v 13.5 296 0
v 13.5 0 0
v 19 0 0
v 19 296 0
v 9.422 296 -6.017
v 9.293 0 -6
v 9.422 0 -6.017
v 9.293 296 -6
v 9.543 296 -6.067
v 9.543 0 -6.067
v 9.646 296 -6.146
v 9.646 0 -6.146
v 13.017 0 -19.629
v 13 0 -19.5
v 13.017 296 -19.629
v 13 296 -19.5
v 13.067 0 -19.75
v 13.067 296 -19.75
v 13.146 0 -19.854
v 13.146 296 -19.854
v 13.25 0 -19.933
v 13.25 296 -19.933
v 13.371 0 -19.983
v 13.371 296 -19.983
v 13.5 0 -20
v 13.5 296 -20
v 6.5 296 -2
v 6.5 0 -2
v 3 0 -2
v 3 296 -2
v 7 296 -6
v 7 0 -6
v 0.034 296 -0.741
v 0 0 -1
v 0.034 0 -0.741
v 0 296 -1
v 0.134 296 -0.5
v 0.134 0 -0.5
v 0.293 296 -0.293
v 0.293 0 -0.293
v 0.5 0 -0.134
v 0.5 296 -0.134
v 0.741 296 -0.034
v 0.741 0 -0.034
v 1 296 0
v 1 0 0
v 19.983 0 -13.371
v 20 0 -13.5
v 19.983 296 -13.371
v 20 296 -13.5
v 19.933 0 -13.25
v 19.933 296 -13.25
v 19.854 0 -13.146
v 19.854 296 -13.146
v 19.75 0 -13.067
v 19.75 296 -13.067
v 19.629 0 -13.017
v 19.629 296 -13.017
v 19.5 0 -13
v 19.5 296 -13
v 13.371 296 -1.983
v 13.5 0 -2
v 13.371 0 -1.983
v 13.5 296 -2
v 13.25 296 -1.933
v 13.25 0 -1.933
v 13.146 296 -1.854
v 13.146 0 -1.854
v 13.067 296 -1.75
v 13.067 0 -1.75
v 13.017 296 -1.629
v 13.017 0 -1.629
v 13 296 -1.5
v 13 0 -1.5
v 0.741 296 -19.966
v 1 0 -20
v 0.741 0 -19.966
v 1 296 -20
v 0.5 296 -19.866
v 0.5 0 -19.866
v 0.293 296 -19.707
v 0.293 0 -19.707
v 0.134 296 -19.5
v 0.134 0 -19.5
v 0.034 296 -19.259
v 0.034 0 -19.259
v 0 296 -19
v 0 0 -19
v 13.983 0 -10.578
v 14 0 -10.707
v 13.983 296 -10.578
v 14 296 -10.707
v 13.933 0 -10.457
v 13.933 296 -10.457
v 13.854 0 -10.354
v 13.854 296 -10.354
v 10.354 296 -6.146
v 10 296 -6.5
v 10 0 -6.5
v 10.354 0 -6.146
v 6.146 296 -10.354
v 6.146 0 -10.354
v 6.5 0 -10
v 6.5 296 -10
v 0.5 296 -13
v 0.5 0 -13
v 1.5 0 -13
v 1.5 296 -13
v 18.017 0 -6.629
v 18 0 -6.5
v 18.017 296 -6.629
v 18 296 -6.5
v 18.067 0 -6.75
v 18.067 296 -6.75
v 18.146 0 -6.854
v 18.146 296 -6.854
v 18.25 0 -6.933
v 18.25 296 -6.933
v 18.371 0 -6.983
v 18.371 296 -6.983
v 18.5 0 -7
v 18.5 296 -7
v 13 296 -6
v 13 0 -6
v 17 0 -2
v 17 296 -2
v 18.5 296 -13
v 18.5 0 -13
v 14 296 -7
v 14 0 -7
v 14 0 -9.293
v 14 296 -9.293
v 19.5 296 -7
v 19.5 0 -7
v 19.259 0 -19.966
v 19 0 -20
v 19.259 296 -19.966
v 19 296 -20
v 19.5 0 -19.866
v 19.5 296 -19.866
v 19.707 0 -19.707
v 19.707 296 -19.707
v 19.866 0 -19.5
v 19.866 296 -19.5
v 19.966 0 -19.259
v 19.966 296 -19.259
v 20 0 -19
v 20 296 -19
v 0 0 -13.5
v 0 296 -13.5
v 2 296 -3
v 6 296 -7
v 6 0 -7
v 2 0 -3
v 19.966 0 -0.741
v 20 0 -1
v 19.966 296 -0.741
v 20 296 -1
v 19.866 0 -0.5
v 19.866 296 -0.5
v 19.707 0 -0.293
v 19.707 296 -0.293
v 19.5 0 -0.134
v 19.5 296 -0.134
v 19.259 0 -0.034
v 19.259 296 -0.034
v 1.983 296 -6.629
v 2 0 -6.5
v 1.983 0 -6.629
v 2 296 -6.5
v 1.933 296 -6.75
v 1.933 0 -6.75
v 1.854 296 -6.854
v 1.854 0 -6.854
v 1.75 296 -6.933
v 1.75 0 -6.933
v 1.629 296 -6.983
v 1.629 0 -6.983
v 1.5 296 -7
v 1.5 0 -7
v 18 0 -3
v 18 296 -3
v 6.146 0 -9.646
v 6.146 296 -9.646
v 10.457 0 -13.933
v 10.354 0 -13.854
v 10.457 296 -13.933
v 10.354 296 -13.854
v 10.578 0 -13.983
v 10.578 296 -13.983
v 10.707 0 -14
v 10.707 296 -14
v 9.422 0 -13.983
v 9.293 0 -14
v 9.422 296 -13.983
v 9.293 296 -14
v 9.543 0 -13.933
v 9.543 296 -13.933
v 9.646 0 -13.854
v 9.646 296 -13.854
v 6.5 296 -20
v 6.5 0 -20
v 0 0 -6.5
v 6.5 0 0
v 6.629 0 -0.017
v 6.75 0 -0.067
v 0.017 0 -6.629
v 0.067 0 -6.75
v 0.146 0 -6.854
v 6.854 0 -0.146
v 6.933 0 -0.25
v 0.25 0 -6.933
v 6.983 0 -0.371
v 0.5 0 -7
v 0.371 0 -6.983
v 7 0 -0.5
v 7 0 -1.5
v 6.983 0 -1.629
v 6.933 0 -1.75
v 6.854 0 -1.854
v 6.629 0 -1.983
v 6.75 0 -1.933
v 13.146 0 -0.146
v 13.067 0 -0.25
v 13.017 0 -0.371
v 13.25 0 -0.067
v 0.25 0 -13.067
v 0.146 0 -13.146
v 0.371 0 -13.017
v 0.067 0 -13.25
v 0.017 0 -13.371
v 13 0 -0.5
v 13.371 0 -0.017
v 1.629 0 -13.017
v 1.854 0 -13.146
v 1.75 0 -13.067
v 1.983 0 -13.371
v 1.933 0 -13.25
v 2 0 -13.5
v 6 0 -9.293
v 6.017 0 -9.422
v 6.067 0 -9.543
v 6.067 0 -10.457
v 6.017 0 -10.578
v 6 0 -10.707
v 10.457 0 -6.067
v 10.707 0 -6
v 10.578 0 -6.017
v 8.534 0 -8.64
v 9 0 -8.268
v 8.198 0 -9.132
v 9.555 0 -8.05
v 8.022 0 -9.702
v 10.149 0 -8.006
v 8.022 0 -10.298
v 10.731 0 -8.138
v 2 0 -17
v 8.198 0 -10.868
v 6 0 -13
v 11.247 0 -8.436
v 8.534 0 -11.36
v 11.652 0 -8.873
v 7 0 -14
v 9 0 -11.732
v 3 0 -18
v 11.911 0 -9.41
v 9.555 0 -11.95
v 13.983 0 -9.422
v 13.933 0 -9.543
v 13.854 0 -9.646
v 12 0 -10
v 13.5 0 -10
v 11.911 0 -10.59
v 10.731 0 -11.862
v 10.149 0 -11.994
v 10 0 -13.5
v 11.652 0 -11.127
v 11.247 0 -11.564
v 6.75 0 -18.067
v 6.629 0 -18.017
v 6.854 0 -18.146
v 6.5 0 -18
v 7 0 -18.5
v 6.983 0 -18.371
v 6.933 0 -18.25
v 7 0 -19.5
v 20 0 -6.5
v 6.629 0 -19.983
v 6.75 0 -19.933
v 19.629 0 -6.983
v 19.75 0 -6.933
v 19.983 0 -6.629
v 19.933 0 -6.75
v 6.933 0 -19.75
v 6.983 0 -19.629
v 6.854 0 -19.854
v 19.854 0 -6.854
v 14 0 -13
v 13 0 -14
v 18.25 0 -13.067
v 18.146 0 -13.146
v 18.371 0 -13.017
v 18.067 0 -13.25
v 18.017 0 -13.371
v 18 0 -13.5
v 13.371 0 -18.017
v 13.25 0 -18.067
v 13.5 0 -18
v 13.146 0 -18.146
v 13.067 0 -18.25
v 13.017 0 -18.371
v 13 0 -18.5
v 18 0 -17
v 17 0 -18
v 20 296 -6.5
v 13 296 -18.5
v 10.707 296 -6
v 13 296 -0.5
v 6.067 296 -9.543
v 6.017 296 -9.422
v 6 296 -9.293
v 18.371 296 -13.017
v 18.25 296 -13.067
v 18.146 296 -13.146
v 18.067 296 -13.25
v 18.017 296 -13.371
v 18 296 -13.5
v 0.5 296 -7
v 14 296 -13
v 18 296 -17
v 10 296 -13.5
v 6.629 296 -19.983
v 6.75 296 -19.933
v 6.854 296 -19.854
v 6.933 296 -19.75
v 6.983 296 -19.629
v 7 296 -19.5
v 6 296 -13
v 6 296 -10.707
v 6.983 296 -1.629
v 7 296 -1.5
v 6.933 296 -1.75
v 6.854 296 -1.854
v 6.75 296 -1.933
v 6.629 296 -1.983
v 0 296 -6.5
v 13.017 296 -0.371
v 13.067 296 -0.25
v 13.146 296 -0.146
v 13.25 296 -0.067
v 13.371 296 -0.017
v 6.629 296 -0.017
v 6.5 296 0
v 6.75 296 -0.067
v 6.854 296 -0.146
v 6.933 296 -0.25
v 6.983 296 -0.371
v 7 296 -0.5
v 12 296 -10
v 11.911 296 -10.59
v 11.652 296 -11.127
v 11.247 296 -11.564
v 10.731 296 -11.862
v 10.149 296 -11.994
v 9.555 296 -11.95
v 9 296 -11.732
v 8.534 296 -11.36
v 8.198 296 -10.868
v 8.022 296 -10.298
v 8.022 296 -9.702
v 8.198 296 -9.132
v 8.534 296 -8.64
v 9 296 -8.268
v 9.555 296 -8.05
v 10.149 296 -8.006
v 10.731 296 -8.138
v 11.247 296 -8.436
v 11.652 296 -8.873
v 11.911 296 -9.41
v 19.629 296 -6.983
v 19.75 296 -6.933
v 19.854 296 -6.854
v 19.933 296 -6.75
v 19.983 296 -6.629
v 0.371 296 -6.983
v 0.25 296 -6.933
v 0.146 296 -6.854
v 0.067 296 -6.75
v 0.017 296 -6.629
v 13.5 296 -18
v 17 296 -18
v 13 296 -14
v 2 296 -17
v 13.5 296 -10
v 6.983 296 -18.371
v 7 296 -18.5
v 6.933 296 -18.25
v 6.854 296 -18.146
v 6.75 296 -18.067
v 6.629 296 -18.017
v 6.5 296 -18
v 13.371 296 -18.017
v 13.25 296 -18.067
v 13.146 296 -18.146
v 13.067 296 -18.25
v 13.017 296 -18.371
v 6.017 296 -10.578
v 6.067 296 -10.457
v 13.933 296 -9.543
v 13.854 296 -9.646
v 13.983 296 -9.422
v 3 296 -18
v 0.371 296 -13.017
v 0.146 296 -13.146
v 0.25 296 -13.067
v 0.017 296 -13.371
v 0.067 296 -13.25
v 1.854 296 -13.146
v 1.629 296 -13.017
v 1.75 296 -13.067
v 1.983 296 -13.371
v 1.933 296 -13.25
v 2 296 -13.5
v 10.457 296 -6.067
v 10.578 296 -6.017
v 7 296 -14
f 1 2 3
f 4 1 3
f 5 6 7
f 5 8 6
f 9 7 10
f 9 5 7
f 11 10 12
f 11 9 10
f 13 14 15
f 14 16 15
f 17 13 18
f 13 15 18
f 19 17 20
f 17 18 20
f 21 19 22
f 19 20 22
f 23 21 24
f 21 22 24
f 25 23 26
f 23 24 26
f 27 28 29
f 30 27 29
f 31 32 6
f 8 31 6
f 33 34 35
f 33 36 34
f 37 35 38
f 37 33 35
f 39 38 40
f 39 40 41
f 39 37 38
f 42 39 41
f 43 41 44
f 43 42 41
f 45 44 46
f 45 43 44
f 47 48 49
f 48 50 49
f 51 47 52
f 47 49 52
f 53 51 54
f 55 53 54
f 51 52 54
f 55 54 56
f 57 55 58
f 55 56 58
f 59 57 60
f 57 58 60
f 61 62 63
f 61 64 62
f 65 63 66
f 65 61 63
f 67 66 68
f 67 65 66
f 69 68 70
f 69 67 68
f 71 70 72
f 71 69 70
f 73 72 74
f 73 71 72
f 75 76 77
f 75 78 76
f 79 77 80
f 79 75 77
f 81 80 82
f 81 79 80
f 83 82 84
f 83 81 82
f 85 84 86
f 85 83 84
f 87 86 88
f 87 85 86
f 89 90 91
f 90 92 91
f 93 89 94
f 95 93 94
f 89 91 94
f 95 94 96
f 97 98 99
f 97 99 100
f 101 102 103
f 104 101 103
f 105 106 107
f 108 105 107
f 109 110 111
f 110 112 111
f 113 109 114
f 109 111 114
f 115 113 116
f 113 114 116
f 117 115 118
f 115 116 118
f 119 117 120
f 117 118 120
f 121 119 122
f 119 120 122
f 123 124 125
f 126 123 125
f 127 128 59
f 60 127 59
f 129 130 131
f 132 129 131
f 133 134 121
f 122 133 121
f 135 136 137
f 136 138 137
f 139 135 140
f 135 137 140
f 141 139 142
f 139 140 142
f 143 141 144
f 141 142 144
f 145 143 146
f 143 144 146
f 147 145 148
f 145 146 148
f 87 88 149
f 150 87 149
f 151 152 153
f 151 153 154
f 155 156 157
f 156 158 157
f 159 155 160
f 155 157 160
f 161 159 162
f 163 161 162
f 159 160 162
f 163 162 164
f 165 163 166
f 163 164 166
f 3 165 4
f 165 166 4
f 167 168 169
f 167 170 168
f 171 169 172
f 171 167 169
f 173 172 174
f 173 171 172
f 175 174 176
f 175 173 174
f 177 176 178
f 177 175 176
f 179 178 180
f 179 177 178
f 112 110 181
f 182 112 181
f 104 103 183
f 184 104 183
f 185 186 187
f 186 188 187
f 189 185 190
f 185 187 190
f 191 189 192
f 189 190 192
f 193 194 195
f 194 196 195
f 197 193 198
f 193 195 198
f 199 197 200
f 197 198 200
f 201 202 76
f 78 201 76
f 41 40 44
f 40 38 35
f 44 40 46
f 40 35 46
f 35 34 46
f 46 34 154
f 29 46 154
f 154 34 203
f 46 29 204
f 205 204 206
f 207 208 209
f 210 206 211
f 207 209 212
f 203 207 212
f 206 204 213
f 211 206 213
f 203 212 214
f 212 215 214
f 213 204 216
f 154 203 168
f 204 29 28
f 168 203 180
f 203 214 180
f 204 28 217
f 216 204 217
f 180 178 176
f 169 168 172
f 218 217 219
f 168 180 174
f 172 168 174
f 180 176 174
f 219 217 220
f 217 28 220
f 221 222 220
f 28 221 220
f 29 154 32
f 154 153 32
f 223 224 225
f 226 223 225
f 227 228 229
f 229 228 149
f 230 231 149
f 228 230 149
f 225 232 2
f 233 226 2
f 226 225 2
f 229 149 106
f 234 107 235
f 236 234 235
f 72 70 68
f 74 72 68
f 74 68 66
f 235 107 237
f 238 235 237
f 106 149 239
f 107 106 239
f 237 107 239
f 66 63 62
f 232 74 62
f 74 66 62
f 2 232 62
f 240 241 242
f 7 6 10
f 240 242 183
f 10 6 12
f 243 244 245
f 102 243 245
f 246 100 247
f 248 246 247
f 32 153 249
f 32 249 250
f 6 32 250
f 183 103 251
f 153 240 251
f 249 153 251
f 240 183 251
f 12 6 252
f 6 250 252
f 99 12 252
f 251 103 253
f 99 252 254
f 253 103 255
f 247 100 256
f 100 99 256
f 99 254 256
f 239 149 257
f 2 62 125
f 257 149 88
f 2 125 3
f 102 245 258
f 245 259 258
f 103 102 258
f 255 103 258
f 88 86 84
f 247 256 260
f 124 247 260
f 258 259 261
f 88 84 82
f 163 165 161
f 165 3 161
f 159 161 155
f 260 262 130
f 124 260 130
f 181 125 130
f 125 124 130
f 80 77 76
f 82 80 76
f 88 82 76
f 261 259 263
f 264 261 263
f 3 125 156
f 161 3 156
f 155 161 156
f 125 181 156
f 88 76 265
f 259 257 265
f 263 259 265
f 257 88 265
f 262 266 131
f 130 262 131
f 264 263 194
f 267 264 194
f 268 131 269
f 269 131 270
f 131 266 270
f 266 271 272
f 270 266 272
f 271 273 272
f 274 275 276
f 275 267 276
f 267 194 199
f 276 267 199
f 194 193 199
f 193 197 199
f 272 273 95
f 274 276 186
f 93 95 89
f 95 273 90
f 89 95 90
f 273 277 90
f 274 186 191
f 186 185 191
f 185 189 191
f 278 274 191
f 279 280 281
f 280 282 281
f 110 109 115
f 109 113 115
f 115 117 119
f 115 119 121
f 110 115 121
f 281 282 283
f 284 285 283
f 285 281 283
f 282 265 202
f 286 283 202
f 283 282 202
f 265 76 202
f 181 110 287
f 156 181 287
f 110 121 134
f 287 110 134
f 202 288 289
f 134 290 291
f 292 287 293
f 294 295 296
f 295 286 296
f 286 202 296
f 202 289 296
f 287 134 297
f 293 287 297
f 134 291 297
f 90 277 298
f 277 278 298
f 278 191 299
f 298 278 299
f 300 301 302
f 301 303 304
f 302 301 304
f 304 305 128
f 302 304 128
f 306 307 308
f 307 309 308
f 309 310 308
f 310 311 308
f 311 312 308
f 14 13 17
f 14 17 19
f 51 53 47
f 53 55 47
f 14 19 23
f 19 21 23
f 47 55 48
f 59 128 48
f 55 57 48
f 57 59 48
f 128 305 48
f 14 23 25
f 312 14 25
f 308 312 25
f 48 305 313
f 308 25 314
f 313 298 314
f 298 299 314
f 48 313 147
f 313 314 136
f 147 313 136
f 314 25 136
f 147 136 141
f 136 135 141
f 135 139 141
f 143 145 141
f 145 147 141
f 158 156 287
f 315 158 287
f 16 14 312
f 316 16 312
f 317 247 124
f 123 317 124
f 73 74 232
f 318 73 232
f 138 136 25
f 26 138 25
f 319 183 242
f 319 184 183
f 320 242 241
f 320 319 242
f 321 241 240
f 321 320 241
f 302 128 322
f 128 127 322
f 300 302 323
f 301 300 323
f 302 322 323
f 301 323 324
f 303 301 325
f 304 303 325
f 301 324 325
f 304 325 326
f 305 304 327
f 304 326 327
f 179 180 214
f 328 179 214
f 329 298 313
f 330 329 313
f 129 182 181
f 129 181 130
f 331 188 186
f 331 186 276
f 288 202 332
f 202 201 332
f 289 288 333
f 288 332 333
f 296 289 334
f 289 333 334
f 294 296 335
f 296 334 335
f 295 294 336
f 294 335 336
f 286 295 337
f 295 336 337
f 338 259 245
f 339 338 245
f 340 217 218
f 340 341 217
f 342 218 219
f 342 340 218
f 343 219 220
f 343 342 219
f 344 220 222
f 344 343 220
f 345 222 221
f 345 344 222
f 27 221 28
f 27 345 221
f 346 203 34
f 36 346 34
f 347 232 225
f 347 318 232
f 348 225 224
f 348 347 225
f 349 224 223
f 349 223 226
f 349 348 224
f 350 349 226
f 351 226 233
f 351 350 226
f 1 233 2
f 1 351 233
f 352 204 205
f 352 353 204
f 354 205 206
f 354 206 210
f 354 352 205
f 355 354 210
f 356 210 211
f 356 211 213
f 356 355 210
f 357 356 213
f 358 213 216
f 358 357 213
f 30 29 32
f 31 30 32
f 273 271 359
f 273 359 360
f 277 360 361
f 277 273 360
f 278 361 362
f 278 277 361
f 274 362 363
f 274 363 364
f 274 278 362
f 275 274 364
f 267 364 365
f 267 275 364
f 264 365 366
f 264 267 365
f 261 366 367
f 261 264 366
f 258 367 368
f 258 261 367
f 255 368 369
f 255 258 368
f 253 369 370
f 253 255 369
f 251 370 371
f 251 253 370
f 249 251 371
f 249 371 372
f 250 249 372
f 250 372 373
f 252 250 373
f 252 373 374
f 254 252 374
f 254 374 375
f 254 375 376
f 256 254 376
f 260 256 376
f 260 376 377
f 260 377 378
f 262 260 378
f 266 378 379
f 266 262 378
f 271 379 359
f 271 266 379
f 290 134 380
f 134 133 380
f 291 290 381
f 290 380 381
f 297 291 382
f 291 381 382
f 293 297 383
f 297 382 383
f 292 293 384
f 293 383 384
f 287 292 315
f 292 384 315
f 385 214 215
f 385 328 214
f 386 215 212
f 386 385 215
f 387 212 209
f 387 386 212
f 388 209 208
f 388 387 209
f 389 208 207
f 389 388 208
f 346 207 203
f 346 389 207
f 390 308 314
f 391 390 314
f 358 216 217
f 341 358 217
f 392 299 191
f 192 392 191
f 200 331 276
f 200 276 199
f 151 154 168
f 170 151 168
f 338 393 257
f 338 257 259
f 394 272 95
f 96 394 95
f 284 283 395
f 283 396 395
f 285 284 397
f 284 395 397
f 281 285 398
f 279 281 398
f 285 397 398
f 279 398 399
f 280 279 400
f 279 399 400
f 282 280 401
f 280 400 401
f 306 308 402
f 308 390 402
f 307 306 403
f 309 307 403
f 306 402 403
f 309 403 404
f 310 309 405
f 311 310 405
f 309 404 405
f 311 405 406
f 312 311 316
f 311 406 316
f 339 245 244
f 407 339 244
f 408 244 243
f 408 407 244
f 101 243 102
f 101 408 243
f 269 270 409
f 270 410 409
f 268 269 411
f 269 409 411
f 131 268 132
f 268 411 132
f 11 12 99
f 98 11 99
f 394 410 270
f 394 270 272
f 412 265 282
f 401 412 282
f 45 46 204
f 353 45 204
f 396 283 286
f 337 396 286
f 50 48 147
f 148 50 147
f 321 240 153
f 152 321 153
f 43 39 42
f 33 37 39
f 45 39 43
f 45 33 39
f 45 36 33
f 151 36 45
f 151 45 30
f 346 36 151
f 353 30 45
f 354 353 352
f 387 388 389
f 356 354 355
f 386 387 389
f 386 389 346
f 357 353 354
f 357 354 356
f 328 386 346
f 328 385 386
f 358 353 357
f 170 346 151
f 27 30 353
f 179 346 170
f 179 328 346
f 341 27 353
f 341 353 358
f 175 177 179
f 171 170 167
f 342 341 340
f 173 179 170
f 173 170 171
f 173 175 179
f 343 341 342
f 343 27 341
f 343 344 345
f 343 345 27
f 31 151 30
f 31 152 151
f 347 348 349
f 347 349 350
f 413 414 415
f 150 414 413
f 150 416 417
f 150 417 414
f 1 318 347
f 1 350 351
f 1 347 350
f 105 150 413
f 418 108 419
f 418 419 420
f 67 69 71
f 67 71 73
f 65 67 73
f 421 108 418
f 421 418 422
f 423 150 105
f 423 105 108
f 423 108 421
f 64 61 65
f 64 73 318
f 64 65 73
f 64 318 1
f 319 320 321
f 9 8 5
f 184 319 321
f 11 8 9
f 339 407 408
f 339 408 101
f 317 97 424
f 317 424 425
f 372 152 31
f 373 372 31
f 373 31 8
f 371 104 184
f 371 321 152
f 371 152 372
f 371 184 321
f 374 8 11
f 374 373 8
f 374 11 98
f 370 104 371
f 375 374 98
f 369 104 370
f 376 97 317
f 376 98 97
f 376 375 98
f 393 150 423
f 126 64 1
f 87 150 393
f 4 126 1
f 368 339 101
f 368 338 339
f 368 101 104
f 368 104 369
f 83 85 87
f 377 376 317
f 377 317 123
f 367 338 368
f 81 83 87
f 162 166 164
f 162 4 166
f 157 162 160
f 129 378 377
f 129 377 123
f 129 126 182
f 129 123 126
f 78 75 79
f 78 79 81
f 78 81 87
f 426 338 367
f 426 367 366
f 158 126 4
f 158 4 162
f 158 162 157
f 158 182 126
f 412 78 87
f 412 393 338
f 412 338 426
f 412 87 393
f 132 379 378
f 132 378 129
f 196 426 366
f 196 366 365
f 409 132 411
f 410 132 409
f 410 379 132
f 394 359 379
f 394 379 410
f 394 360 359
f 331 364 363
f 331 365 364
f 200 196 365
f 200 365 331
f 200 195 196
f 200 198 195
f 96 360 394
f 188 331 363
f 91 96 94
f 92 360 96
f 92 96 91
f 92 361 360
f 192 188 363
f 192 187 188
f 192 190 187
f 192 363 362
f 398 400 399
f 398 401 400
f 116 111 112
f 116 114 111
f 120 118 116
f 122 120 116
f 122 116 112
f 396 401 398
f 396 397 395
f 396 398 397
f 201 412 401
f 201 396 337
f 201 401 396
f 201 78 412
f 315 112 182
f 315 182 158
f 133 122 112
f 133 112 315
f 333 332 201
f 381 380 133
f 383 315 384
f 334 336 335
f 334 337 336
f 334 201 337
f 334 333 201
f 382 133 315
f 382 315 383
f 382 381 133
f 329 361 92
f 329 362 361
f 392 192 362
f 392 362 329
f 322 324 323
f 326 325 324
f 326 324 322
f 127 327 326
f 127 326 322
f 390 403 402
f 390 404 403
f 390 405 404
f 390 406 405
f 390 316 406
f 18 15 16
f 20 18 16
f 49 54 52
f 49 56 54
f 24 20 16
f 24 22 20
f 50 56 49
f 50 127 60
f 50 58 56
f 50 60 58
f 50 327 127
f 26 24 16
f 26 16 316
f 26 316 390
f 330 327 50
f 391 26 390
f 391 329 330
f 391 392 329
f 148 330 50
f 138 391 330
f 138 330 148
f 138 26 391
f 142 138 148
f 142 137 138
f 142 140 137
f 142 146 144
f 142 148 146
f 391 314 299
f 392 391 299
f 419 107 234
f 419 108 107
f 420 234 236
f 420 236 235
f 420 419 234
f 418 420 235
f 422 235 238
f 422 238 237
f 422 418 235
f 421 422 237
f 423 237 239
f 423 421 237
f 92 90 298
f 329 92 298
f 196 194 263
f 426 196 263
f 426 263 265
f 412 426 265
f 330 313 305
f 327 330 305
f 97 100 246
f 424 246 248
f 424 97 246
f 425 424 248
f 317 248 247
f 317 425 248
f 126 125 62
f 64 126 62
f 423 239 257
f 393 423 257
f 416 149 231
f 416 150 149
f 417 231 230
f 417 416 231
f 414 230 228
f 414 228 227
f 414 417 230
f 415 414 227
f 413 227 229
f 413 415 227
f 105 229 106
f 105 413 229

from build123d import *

# Parameters (mm, degrees)
SKETCH1_R           = 2
BOSS_EXTRUDE1_DEPTH = 296
FILLET1_R           = 1
FILLET2_R           = 0.5
FILLET4_R           = 0.5


with BuildPart() as part:
    # Sketch1 → Boss-Extrude1 (new body)
    with BuildSketch(Plane(origin=(0, 0, 0), x_dir=(1, 0, 0), z_dir=(0, 1, 0))):
        Polygon((7, 18), (7, 20), (0, 20), (0, 13), (2, 13), (2, 17), (6, 13), (6, 10.5), (6.5, 10), (6, 9.5), (6, 7), (2, 3), (2, 7), (0, 7), (0, 0), (7, 0), (7, 2), (3, 2), (7, 6), (9.5, 6), (10, 6.5), (10.5, 6), (13, 6), (17, 2), (13, 2), (13, 0), (20, 0), (20, 7), (18, 7), (18, 3), (14, 7), (14, 9.5), (13.5, 10), (14, 10.5), (14, 13), (18, 17), (18, 13), (20, 13), (20, 20), (13, 20), (13, 18), (17, 18), (13, 14), (10.5, 14), (10, 13.5), (9.5, 14), (7, 14), (3, 18), align=None)
        with Locations((10, 10)):
            Circle(SKETCH1_R, mode=Mode.SUBTRACT)
    extrude(amount=BOSS_EXTRUDE1_DEPTH)

    # Fillet1
    fillet1_edges = [part.edges().sort_by_distance(p)[0] for p in [
        (0, 148, -20),
        (20, 148, -20),
        (20, 148, 0),
        (0, 148, 0),
    ]]
    fillet(fillet1_edges, radius=FILLET1_R)

    # Fillet2
    fillet2_edges = [part.edges().sort_by_distance(p)[0] for p in [
        (2, 148, -13),
        (0, 148, -13),
        (7, 148, -20),
        (7, 148, -18),
        (13, 148, -18),
        (13, 148, -20),
        (20, 148, -13),
        (18, 148, -13),
        (18, 148, -7),
        (20, 148, -7),
        (13, 148, 0),
        (13, 148, -2),
        (7, 148, -2),
        (7, 148, 0),
        (0, 148, -7),
        (2, 148, -7),
    ]]
    fillet(fillet2_edges, radius=FILLET2_R)

    # Fillet4
    fillet4_edges = [part.edges().sort_by_distance(p)[0] for p in [
        (9.5, 148, -14),
        (10.5, 148, -14),
        (14, 148, -10.5),
        (14, 148, -9.5),
        (10.5, 148, -6),
        (9.5, 148, -6),
        (6, 148, -9.5),
        (6, 148, -10.5),
    ]]
    fillet(fillet4_edges, radius=FILLET4_R)


solid = part.part
